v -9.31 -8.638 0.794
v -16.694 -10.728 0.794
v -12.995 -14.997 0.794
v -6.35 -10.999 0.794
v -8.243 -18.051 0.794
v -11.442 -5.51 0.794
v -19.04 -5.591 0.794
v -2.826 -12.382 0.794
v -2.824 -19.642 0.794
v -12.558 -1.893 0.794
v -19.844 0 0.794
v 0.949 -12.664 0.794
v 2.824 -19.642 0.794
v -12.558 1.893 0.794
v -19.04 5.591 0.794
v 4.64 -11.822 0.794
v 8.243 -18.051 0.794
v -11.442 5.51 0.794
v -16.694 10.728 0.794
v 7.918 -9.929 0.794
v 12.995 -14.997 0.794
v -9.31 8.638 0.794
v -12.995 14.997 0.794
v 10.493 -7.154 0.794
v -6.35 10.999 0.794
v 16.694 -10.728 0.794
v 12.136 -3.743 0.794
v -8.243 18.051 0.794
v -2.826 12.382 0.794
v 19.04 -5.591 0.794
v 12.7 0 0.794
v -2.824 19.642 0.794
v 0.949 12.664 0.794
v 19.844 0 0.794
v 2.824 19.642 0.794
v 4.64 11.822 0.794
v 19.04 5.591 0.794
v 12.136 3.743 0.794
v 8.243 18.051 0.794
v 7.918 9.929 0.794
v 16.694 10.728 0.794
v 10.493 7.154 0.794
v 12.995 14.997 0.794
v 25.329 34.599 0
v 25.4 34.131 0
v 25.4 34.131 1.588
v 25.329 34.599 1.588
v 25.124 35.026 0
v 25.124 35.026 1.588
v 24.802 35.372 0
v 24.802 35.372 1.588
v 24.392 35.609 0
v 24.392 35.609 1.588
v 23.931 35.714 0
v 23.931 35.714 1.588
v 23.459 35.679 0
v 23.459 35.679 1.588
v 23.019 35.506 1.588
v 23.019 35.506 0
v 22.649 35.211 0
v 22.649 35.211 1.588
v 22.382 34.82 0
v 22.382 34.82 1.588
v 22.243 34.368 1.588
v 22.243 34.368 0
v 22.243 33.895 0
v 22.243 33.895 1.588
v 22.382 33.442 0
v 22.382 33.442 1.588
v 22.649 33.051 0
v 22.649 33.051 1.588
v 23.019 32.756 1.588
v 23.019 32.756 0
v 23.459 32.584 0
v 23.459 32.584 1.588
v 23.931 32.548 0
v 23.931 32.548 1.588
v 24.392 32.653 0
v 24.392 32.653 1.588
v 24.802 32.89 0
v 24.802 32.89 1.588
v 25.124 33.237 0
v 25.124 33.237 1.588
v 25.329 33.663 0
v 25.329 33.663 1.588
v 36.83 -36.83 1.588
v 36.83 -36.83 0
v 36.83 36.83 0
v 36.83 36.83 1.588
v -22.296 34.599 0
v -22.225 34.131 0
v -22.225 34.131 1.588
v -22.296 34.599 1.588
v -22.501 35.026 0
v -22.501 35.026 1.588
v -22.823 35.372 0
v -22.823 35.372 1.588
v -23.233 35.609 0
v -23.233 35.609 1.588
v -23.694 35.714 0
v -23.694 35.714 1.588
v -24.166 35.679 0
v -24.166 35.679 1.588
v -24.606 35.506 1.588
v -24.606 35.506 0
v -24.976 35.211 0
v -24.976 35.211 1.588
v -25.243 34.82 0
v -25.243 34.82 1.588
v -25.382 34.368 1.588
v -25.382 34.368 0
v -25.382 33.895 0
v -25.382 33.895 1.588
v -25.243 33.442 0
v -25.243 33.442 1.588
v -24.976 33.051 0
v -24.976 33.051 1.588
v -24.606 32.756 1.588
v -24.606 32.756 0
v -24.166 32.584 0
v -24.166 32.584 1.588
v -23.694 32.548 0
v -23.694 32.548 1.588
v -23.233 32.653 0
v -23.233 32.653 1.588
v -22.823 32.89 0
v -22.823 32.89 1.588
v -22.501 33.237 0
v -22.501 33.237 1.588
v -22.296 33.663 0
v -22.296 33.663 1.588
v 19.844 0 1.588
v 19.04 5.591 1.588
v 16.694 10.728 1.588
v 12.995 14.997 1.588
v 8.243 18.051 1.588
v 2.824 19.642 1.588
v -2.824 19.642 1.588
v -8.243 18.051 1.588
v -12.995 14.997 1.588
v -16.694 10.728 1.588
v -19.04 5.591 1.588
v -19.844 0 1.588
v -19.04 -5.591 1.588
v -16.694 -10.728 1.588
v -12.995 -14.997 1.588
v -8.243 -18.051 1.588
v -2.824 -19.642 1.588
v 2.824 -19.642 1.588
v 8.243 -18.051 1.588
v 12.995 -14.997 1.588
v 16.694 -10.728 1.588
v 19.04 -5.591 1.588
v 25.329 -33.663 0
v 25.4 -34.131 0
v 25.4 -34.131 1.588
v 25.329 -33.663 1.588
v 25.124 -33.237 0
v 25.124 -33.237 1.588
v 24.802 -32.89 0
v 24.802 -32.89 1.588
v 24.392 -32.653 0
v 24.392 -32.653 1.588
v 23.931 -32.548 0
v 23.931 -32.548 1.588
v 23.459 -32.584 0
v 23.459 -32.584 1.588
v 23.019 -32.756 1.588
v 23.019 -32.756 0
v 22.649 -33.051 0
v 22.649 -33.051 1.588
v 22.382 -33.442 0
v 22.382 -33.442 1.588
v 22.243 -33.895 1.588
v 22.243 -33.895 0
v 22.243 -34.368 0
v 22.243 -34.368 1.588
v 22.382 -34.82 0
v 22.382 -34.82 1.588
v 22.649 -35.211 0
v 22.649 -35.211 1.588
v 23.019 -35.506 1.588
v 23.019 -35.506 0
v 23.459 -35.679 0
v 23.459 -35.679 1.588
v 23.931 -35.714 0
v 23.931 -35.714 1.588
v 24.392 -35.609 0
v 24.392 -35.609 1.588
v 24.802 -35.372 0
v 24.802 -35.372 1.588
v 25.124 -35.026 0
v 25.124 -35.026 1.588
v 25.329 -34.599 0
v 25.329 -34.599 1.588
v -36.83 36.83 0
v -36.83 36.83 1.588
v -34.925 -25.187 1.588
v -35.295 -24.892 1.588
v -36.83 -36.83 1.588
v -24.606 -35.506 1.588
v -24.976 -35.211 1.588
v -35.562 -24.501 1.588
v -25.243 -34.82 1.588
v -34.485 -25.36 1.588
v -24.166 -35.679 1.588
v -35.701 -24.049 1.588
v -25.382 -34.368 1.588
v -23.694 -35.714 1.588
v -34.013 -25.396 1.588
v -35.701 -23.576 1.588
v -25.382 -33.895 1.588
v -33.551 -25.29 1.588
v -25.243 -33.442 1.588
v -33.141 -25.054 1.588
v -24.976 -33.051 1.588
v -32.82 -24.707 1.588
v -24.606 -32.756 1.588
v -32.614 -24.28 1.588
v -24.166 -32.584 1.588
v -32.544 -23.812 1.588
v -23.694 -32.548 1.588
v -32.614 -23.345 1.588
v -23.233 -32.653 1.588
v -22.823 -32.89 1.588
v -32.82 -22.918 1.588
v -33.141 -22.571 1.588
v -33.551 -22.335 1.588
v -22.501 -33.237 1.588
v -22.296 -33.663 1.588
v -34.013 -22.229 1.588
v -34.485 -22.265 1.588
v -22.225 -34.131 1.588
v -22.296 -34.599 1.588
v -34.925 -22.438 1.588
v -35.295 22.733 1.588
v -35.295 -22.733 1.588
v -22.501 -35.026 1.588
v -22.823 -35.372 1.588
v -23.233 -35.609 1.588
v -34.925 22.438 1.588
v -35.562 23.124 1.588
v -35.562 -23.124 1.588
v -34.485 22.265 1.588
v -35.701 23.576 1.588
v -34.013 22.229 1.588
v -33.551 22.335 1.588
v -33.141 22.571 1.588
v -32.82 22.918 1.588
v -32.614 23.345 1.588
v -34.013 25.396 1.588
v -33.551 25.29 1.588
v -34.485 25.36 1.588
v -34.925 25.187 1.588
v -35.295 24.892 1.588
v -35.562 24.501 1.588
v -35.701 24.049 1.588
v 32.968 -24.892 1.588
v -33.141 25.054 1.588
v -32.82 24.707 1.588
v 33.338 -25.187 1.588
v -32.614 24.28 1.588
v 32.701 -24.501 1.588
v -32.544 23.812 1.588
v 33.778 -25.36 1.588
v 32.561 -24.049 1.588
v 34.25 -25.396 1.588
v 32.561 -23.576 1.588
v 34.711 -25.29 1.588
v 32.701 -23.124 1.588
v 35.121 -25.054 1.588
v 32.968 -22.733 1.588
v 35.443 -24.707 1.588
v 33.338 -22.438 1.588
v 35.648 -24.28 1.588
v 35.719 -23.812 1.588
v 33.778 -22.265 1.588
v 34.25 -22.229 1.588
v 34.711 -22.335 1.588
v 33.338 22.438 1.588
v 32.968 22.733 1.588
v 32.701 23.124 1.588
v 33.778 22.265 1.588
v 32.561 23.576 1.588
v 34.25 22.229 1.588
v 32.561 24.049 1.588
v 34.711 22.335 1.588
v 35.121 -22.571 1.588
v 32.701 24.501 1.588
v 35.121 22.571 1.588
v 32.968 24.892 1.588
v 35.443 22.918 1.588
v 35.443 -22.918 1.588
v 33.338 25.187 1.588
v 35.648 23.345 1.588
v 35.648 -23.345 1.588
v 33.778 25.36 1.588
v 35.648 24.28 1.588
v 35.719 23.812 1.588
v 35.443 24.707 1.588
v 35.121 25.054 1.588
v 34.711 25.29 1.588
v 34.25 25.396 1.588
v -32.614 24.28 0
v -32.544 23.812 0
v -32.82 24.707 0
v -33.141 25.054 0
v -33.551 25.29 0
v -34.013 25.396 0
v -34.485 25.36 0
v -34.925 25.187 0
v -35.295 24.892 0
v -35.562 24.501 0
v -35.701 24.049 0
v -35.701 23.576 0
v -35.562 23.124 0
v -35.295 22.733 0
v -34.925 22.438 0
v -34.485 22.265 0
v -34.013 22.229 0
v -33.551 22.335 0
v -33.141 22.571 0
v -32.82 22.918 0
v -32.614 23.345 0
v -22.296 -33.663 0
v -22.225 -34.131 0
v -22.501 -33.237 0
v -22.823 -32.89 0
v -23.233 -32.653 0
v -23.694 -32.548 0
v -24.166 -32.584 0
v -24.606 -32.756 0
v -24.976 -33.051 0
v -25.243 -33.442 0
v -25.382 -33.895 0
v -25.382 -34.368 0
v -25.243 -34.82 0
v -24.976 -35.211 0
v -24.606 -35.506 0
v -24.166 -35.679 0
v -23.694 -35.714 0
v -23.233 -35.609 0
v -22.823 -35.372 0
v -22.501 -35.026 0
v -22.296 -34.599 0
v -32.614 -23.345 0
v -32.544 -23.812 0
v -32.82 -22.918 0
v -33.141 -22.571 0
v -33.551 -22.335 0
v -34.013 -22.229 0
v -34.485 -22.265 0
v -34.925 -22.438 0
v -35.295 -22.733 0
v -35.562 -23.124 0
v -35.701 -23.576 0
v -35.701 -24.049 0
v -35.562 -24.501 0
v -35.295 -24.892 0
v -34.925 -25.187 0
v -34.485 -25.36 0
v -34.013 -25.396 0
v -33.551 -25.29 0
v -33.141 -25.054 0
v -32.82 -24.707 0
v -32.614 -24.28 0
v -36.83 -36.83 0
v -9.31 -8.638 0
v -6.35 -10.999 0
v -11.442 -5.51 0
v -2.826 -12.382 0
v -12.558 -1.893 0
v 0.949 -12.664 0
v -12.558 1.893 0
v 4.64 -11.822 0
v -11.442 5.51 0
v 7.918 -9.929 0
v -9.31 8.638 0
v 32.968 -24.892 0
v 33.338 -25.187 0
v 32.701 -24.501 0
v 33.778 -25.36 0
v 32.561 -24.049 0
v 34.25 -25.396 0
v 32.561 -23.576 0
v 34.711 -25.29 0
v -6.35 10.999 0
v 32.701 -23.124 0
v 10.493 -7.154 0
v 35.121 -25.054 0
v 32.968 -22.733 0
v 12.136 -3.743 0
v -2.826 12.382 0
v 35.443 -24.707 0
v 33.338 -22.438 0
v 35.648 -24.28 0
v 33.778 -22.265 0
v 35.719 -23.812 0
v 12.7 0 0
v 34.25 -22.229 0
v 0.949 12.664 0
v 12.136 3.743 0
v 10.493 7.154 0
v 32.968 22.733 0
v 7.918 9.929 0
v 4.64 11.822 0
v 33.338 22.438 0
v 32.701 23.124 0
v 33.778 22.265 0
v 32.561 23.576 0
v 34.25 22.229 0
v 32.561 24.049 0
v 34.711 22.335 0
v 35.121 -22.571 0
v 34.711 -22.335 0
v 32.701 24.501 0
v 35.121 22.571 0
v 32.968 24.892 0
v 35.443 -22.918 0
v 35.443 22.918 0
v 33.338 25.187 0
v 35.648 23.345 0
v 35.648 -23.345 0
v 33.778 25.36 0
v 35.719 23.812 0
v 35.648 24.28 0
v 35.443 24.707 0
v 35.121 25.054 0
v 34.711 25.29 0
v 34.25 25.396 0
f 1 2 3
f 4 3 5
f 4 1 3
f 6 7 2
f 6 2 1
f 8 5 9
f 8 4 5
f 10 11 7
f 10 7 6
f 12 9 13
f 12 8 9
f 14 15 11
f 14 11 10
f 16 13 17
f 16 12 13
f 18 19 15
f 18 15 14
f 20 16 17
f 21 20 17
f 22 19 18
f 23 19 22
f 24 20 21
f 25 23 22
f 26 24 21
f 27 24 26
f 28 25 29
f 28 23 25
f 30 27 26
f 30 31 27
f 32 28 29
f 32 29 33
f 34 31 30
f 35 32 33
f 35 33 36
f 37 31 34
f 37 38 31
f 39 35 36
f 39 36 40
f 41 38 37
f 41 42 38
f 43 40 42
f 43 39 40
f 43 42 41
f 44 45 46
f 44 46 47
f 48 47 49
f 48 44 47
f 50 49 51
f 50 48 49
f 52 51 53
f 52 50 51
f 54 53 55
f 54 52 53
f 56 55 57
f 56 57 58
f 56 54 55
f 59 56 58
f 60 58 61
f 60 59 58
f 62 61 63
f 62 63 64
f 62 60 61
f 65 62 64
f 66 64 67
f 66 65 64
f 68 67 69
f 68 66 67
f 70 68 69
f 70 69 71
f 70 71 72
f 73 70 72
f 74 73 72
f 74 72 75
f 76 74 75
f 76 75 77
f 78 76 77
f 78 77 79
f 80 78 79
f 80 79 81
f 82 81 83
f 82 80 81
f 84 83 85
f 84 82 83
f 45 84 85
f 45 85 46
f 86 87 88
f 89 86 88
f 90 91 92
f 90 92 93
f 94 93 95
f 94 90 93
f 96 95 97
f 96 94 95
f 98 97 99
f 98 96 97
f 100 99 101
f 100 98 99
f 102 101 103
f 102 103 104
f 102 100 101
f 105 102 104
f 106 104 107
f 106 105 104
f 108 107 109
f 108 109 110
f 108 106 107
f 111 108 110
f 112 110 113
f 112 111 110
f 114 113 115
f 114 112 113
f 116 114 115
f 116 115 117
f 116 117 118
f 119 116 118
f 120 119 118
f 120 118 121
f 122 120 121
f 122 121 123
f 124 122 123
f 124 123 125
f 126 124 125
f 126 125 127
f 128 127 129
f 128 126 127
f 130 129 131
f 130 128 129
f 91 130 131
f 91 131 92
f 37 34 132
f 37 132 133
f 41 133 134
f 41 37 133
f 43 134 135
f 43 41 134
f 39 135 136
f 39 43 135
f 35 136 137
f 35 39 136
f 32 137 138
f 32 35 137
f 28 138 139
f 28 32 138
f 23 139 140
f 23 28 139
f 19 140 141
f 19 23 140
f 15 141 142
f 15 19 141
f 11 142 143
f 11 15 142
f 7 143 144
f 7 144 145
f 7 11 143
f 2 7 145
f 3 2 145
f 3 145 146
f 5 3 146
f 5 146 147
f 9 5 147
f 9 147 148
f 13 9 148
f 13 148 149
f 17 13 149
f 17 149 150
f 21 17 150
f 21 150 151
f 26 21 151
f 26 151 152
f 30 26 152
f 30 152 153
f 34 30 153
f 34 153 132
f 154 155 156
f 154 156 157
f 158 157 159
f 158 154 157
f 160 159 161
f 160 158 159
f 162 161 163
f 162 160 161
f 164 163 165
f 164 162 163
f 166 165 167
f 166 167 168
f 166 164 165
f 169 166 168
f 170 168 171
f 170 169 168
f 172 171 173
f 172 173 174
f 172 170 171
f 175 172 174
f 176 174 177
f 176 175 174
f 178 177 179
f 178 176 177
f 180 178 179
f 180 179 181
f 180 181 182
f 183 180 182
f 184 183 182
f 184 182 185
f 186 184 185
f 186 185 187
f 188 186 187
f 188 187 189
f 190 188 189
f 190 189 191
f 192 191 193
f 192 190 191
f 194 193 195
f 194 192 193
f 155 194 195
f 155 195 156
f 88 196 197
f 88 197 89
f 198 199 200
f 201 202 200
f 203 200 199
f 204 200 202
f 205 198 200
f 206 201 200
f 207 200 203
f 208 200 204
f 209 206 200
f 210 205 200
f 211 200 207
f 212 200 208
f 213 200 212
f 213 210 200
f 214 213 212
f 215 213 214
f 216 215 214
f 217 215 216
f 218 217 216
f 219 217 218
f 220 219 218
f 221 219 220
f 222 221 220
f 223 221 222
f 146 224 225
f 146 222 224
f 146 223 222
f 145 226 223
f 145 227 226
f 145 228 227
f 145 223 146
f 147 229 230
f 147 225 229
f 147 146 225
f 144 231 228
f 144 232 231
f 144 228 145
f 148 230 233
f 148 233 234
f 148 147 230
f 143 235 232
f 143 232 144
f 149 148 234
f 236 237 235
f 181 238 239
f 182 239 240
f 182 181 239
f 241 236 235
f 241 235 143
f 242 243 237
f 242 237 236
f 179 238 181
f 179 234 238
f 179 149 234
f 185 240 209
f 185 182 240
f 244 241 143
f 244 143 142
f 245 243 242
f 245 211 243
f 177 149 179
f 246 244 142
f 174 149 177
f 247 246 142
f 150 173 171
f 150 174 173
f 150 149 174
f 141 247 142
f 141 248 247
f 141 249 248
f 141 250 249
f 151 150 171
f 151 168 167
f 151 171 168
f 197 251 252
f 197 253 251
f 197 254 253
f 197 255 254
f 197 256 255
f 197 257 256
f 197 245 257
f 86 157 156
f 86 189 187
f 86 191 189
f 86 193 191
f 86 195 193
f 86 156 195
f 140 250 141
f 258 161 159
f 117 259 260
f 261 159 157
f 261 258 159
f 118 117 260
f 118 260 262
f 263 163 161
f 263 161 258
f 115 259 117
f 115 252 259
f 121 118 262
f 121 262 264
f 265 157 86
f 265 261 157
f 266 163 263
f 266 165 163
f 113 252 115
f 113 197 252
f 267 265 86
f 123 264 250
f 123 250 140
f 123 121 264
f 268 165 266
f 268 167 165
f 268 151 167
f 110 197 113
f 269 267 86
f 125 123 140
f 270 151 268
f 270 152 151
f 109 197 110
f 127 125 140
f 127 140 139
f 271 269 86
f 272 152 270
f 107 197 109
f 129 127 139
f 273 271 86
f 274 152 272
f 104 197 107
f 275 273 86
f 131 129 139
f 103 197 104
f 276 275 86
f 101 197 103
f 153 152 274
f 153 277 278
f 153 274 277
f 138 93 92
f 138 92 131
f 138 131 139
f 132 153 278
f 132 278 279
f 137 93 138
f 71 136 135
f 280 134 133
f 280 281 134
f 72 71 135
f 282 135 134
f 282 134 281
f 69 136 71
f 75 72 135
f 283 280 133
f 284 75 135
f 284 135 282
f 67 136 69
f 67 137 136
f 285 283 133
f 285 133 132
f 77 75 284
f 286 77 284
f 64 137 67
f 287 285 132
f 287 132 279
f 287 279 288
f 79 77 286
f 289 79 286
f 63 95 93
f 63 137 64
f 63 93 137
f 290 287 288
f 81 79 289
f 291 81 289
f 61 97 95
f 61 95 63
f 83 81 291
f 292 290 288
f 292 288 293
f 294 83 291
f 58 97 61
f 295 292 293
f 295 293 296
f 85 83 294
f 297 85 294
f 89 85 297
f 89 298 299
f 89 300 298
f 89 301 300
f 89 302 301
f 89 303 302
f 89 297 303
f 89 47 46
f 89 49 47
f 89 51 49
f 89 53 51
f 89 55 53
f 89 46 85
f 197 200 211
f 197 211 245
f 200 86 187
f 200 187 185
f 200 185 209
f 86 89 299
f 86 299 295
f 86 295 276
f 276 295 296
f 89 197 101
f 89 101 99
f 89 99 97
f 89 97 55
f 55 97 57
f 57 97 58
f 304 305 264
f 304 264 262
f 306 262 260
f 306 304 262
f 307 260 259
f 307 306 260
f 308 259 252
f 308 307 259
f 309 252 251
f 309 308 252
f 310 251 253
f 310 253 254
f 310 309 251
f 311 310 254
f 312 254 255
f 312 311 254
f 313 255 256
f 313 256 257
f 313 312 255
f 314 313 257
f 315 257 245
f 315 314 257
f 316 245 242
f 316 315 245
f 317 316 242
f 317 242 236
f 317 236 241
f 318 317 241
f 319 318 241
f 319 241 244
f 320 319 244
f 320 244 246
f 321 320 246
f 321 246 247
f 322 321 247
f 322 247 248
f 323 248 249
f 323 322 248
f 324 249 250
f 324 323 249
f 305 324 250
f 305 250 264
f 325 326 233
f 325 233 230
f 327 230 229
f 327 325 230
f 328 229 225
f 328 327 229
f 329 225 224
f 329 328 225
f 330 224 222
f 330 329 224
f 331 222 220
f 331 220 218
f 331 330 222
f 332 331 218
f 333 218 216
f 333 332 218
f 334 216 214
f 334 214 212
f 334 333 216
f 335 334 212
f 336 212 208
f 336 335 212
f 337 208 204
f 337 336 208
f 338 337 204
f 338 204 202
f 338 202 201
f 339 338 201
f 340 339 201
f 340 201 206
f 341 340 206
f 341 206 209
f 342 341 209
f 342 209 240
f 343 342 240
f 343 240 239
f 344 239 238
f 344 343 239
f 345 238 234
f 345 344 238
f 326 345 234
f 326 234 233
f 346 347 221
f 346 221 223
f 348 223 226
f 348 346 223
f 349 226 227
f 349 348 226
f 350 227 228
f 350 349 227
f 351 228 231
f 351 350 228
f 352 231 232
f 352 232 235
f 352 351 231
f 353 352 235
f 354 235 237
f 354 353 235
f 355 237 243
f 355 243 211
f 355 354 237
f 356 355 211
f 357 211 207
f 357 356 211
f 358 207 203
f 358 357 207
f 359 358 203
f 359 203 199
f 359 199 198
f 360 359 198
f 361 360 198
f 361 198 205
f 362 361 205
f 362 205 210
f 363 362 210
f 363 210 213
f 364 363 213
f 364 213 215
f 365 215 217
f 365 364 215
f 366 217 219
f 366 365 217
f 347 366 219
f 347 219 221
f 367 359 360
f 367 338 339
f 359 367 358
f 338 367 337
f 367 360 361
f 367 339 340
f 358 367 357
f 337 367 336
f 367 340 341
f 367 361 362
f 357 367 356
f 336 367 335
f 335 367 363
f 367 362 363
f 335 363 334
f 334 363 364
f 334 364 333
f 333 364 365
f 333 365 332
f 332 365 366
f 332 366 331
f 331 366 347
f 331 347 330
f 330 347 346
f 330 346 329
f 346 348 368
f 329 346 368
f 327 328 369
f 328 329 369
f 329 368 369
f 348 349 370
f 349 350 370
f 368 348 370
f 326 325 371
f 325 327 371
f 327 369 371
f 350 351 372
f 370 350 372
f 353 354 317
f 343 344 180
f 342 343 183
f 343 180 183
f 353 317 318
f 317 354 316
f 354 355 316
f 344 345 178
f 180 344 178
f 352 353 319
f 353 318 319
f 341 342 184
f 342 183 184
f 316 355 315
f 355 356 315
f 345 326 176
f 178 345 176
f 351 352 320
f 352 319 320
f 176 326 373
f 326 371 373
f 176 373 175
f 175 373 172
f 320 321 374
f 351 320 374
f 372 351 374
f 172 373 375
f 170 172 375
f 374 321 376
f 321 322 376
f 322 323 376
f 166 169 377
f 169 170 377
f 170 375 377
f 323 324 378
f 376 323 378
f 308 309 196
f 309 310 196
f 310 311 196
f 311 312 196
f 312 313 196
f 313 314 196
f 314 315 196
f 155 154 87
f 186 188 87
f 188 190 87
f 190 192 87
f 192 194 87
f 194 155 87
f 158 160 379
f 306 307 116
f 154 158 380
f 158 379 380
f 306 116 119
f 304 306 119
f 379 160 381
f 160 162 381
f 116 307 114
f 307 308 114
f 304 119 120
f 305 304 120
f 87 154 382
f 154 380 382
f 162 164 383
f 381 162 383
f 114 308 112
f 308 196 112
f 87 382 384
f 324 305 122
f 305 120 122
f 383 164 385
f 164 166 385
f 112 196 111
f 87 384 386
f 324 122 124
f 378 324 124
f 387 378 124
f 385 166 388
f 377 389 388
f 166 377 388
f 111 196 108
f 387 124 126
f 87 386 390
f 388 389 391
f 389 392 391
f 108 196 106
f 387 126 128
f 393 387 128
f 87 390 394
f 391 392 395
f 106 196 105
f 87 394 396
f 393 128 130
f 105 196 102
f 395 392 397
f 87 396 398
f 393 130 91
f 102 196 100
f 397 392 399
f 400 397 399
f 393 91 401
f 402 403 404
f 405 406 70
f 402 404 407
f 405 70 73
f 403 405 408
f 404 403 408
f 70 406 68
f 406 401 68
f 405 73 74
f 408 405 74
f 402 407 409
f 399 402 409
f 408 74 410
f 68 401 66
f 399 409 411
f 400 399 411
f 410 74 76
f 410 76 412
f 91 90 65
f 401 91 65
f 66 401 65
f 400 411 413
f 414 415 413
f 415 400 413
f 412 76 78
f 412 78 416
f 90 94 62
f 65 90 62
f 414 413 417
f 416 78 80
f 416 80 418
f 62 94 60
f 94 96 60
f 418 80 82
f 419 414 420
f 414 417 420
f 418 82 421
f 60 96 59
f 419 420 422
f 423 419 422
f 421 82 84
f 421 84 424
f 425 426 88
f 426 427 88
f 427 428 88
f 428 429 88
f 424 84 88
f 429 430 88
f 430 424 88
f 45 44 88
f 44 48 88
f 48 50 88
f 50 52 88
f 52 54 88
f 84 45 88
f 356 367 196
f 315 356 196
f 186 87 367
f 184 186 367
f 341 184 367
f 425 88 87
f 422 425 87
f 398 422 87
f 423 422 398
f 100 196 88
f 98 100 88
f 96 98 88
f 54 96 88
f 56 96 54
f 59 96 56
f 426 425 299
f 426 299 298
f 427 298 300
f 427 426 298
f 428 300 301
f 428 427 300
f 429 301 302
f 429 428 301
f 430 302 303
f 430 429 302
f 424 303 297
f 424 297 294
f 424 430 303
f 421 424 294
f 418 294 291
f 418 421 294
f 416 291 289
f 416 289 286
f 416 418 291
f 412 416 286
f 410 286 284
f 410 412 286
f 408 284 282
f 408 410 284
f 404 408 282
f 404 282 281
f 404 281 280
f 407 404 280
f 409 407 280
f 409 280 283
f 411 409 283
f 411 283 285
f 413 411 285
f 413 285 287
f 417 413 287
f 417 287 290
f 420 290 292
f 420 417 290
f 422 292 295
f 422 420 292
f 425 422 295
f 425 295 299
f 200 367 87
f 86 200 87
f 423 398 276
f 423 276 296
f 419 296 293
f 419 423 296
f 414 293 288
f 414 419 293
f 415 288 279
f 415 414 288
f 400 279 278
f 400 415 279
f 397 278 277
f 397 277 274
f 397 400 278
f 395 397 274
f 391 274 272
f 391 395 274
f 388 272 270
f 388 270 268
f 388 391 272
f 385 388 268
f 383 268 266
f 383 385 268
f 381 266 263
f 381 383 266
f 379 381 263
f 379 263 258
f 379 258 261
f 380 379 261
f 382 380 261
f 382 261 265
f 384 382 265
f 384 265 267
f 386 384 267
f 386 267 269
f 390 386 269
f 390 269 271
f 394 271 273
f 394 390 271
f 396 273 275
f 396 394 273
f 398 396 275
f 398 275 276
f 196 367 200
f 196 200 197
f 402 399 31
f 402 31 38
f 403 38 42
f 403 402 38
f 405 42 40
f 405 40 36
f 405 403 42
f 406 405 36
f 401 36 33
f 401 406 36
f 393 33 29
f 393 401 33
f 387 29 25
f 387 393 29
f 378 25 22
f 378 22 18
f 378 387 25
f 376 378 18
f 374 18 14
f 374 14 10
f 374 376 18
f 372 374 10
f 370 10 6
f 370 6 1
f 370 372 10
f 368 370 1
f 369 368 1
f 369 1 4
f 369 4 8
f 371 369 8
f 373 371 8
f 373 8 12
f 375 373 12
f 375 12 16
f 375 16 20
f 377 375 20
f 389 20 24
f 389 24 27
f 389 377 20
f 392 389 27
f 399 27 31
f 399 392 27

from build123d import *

# Parameters (mm, degrees)
F0_R     = 19.84375
F0_R_2   = 12.7
F1_DEPTH = 0.79375
F0_W     = 73.66
F0_H     = 73.66
F0_R_3   = 1.5875
F2_DEPTH = 1.5875


with BuildPart() as f1:
    # F0 (on Top) → F1 (new body)
    with BuildSketch(Plane.XY):
        Circle(F0_R)
        Circle(F0_R_2, mode=Mode.SUBTRACT)
    extrude(amount=F1_DEPTH)

    # F0 (on Top) → F2 (join)
    with BuildSketch(Plane.XY):
        Rectangle(F0_W, F0_H)
        with Locations((-23.8125, -34.13125)):
            Circle(F0_R_3, mode=Mode.SUBTRACT)
        with Locations((-34.13125, -23.8125)):
            Circle(F0_R_3, mode=Mode.SUBTRACT)
        Circle(F0_R, mode=Mode.SUBTRACT)
        with Locations((23.8125, -34.13125)):
            Circle(F0_R_3, mode=Mode.SUBTRACT)
        with Locations((34.13125, -23.8125)):
            Circle(F0_R_3, mode=Mode.SUBTRACT)
        with Locations((-34.13125, 23.8125)):
            Circle(F0_R_3, mode=Mode.SUBTRACT)
        with Locations((-23.8125, 34.13125)):
            Circle(F0_R_3, mode=Mode.SUBTRACT)
        with Locations((34.13125, 23.8125)):
            Circle(F0_R_3, mode=Mode.SUBTRACT)
        with Locations((23.8125, 34.13125)):
            Circle(F0_R_3, mode=Mode.SUBTRACT)
    extrude(amount=F2_DEPTH)


solid = f1.part
